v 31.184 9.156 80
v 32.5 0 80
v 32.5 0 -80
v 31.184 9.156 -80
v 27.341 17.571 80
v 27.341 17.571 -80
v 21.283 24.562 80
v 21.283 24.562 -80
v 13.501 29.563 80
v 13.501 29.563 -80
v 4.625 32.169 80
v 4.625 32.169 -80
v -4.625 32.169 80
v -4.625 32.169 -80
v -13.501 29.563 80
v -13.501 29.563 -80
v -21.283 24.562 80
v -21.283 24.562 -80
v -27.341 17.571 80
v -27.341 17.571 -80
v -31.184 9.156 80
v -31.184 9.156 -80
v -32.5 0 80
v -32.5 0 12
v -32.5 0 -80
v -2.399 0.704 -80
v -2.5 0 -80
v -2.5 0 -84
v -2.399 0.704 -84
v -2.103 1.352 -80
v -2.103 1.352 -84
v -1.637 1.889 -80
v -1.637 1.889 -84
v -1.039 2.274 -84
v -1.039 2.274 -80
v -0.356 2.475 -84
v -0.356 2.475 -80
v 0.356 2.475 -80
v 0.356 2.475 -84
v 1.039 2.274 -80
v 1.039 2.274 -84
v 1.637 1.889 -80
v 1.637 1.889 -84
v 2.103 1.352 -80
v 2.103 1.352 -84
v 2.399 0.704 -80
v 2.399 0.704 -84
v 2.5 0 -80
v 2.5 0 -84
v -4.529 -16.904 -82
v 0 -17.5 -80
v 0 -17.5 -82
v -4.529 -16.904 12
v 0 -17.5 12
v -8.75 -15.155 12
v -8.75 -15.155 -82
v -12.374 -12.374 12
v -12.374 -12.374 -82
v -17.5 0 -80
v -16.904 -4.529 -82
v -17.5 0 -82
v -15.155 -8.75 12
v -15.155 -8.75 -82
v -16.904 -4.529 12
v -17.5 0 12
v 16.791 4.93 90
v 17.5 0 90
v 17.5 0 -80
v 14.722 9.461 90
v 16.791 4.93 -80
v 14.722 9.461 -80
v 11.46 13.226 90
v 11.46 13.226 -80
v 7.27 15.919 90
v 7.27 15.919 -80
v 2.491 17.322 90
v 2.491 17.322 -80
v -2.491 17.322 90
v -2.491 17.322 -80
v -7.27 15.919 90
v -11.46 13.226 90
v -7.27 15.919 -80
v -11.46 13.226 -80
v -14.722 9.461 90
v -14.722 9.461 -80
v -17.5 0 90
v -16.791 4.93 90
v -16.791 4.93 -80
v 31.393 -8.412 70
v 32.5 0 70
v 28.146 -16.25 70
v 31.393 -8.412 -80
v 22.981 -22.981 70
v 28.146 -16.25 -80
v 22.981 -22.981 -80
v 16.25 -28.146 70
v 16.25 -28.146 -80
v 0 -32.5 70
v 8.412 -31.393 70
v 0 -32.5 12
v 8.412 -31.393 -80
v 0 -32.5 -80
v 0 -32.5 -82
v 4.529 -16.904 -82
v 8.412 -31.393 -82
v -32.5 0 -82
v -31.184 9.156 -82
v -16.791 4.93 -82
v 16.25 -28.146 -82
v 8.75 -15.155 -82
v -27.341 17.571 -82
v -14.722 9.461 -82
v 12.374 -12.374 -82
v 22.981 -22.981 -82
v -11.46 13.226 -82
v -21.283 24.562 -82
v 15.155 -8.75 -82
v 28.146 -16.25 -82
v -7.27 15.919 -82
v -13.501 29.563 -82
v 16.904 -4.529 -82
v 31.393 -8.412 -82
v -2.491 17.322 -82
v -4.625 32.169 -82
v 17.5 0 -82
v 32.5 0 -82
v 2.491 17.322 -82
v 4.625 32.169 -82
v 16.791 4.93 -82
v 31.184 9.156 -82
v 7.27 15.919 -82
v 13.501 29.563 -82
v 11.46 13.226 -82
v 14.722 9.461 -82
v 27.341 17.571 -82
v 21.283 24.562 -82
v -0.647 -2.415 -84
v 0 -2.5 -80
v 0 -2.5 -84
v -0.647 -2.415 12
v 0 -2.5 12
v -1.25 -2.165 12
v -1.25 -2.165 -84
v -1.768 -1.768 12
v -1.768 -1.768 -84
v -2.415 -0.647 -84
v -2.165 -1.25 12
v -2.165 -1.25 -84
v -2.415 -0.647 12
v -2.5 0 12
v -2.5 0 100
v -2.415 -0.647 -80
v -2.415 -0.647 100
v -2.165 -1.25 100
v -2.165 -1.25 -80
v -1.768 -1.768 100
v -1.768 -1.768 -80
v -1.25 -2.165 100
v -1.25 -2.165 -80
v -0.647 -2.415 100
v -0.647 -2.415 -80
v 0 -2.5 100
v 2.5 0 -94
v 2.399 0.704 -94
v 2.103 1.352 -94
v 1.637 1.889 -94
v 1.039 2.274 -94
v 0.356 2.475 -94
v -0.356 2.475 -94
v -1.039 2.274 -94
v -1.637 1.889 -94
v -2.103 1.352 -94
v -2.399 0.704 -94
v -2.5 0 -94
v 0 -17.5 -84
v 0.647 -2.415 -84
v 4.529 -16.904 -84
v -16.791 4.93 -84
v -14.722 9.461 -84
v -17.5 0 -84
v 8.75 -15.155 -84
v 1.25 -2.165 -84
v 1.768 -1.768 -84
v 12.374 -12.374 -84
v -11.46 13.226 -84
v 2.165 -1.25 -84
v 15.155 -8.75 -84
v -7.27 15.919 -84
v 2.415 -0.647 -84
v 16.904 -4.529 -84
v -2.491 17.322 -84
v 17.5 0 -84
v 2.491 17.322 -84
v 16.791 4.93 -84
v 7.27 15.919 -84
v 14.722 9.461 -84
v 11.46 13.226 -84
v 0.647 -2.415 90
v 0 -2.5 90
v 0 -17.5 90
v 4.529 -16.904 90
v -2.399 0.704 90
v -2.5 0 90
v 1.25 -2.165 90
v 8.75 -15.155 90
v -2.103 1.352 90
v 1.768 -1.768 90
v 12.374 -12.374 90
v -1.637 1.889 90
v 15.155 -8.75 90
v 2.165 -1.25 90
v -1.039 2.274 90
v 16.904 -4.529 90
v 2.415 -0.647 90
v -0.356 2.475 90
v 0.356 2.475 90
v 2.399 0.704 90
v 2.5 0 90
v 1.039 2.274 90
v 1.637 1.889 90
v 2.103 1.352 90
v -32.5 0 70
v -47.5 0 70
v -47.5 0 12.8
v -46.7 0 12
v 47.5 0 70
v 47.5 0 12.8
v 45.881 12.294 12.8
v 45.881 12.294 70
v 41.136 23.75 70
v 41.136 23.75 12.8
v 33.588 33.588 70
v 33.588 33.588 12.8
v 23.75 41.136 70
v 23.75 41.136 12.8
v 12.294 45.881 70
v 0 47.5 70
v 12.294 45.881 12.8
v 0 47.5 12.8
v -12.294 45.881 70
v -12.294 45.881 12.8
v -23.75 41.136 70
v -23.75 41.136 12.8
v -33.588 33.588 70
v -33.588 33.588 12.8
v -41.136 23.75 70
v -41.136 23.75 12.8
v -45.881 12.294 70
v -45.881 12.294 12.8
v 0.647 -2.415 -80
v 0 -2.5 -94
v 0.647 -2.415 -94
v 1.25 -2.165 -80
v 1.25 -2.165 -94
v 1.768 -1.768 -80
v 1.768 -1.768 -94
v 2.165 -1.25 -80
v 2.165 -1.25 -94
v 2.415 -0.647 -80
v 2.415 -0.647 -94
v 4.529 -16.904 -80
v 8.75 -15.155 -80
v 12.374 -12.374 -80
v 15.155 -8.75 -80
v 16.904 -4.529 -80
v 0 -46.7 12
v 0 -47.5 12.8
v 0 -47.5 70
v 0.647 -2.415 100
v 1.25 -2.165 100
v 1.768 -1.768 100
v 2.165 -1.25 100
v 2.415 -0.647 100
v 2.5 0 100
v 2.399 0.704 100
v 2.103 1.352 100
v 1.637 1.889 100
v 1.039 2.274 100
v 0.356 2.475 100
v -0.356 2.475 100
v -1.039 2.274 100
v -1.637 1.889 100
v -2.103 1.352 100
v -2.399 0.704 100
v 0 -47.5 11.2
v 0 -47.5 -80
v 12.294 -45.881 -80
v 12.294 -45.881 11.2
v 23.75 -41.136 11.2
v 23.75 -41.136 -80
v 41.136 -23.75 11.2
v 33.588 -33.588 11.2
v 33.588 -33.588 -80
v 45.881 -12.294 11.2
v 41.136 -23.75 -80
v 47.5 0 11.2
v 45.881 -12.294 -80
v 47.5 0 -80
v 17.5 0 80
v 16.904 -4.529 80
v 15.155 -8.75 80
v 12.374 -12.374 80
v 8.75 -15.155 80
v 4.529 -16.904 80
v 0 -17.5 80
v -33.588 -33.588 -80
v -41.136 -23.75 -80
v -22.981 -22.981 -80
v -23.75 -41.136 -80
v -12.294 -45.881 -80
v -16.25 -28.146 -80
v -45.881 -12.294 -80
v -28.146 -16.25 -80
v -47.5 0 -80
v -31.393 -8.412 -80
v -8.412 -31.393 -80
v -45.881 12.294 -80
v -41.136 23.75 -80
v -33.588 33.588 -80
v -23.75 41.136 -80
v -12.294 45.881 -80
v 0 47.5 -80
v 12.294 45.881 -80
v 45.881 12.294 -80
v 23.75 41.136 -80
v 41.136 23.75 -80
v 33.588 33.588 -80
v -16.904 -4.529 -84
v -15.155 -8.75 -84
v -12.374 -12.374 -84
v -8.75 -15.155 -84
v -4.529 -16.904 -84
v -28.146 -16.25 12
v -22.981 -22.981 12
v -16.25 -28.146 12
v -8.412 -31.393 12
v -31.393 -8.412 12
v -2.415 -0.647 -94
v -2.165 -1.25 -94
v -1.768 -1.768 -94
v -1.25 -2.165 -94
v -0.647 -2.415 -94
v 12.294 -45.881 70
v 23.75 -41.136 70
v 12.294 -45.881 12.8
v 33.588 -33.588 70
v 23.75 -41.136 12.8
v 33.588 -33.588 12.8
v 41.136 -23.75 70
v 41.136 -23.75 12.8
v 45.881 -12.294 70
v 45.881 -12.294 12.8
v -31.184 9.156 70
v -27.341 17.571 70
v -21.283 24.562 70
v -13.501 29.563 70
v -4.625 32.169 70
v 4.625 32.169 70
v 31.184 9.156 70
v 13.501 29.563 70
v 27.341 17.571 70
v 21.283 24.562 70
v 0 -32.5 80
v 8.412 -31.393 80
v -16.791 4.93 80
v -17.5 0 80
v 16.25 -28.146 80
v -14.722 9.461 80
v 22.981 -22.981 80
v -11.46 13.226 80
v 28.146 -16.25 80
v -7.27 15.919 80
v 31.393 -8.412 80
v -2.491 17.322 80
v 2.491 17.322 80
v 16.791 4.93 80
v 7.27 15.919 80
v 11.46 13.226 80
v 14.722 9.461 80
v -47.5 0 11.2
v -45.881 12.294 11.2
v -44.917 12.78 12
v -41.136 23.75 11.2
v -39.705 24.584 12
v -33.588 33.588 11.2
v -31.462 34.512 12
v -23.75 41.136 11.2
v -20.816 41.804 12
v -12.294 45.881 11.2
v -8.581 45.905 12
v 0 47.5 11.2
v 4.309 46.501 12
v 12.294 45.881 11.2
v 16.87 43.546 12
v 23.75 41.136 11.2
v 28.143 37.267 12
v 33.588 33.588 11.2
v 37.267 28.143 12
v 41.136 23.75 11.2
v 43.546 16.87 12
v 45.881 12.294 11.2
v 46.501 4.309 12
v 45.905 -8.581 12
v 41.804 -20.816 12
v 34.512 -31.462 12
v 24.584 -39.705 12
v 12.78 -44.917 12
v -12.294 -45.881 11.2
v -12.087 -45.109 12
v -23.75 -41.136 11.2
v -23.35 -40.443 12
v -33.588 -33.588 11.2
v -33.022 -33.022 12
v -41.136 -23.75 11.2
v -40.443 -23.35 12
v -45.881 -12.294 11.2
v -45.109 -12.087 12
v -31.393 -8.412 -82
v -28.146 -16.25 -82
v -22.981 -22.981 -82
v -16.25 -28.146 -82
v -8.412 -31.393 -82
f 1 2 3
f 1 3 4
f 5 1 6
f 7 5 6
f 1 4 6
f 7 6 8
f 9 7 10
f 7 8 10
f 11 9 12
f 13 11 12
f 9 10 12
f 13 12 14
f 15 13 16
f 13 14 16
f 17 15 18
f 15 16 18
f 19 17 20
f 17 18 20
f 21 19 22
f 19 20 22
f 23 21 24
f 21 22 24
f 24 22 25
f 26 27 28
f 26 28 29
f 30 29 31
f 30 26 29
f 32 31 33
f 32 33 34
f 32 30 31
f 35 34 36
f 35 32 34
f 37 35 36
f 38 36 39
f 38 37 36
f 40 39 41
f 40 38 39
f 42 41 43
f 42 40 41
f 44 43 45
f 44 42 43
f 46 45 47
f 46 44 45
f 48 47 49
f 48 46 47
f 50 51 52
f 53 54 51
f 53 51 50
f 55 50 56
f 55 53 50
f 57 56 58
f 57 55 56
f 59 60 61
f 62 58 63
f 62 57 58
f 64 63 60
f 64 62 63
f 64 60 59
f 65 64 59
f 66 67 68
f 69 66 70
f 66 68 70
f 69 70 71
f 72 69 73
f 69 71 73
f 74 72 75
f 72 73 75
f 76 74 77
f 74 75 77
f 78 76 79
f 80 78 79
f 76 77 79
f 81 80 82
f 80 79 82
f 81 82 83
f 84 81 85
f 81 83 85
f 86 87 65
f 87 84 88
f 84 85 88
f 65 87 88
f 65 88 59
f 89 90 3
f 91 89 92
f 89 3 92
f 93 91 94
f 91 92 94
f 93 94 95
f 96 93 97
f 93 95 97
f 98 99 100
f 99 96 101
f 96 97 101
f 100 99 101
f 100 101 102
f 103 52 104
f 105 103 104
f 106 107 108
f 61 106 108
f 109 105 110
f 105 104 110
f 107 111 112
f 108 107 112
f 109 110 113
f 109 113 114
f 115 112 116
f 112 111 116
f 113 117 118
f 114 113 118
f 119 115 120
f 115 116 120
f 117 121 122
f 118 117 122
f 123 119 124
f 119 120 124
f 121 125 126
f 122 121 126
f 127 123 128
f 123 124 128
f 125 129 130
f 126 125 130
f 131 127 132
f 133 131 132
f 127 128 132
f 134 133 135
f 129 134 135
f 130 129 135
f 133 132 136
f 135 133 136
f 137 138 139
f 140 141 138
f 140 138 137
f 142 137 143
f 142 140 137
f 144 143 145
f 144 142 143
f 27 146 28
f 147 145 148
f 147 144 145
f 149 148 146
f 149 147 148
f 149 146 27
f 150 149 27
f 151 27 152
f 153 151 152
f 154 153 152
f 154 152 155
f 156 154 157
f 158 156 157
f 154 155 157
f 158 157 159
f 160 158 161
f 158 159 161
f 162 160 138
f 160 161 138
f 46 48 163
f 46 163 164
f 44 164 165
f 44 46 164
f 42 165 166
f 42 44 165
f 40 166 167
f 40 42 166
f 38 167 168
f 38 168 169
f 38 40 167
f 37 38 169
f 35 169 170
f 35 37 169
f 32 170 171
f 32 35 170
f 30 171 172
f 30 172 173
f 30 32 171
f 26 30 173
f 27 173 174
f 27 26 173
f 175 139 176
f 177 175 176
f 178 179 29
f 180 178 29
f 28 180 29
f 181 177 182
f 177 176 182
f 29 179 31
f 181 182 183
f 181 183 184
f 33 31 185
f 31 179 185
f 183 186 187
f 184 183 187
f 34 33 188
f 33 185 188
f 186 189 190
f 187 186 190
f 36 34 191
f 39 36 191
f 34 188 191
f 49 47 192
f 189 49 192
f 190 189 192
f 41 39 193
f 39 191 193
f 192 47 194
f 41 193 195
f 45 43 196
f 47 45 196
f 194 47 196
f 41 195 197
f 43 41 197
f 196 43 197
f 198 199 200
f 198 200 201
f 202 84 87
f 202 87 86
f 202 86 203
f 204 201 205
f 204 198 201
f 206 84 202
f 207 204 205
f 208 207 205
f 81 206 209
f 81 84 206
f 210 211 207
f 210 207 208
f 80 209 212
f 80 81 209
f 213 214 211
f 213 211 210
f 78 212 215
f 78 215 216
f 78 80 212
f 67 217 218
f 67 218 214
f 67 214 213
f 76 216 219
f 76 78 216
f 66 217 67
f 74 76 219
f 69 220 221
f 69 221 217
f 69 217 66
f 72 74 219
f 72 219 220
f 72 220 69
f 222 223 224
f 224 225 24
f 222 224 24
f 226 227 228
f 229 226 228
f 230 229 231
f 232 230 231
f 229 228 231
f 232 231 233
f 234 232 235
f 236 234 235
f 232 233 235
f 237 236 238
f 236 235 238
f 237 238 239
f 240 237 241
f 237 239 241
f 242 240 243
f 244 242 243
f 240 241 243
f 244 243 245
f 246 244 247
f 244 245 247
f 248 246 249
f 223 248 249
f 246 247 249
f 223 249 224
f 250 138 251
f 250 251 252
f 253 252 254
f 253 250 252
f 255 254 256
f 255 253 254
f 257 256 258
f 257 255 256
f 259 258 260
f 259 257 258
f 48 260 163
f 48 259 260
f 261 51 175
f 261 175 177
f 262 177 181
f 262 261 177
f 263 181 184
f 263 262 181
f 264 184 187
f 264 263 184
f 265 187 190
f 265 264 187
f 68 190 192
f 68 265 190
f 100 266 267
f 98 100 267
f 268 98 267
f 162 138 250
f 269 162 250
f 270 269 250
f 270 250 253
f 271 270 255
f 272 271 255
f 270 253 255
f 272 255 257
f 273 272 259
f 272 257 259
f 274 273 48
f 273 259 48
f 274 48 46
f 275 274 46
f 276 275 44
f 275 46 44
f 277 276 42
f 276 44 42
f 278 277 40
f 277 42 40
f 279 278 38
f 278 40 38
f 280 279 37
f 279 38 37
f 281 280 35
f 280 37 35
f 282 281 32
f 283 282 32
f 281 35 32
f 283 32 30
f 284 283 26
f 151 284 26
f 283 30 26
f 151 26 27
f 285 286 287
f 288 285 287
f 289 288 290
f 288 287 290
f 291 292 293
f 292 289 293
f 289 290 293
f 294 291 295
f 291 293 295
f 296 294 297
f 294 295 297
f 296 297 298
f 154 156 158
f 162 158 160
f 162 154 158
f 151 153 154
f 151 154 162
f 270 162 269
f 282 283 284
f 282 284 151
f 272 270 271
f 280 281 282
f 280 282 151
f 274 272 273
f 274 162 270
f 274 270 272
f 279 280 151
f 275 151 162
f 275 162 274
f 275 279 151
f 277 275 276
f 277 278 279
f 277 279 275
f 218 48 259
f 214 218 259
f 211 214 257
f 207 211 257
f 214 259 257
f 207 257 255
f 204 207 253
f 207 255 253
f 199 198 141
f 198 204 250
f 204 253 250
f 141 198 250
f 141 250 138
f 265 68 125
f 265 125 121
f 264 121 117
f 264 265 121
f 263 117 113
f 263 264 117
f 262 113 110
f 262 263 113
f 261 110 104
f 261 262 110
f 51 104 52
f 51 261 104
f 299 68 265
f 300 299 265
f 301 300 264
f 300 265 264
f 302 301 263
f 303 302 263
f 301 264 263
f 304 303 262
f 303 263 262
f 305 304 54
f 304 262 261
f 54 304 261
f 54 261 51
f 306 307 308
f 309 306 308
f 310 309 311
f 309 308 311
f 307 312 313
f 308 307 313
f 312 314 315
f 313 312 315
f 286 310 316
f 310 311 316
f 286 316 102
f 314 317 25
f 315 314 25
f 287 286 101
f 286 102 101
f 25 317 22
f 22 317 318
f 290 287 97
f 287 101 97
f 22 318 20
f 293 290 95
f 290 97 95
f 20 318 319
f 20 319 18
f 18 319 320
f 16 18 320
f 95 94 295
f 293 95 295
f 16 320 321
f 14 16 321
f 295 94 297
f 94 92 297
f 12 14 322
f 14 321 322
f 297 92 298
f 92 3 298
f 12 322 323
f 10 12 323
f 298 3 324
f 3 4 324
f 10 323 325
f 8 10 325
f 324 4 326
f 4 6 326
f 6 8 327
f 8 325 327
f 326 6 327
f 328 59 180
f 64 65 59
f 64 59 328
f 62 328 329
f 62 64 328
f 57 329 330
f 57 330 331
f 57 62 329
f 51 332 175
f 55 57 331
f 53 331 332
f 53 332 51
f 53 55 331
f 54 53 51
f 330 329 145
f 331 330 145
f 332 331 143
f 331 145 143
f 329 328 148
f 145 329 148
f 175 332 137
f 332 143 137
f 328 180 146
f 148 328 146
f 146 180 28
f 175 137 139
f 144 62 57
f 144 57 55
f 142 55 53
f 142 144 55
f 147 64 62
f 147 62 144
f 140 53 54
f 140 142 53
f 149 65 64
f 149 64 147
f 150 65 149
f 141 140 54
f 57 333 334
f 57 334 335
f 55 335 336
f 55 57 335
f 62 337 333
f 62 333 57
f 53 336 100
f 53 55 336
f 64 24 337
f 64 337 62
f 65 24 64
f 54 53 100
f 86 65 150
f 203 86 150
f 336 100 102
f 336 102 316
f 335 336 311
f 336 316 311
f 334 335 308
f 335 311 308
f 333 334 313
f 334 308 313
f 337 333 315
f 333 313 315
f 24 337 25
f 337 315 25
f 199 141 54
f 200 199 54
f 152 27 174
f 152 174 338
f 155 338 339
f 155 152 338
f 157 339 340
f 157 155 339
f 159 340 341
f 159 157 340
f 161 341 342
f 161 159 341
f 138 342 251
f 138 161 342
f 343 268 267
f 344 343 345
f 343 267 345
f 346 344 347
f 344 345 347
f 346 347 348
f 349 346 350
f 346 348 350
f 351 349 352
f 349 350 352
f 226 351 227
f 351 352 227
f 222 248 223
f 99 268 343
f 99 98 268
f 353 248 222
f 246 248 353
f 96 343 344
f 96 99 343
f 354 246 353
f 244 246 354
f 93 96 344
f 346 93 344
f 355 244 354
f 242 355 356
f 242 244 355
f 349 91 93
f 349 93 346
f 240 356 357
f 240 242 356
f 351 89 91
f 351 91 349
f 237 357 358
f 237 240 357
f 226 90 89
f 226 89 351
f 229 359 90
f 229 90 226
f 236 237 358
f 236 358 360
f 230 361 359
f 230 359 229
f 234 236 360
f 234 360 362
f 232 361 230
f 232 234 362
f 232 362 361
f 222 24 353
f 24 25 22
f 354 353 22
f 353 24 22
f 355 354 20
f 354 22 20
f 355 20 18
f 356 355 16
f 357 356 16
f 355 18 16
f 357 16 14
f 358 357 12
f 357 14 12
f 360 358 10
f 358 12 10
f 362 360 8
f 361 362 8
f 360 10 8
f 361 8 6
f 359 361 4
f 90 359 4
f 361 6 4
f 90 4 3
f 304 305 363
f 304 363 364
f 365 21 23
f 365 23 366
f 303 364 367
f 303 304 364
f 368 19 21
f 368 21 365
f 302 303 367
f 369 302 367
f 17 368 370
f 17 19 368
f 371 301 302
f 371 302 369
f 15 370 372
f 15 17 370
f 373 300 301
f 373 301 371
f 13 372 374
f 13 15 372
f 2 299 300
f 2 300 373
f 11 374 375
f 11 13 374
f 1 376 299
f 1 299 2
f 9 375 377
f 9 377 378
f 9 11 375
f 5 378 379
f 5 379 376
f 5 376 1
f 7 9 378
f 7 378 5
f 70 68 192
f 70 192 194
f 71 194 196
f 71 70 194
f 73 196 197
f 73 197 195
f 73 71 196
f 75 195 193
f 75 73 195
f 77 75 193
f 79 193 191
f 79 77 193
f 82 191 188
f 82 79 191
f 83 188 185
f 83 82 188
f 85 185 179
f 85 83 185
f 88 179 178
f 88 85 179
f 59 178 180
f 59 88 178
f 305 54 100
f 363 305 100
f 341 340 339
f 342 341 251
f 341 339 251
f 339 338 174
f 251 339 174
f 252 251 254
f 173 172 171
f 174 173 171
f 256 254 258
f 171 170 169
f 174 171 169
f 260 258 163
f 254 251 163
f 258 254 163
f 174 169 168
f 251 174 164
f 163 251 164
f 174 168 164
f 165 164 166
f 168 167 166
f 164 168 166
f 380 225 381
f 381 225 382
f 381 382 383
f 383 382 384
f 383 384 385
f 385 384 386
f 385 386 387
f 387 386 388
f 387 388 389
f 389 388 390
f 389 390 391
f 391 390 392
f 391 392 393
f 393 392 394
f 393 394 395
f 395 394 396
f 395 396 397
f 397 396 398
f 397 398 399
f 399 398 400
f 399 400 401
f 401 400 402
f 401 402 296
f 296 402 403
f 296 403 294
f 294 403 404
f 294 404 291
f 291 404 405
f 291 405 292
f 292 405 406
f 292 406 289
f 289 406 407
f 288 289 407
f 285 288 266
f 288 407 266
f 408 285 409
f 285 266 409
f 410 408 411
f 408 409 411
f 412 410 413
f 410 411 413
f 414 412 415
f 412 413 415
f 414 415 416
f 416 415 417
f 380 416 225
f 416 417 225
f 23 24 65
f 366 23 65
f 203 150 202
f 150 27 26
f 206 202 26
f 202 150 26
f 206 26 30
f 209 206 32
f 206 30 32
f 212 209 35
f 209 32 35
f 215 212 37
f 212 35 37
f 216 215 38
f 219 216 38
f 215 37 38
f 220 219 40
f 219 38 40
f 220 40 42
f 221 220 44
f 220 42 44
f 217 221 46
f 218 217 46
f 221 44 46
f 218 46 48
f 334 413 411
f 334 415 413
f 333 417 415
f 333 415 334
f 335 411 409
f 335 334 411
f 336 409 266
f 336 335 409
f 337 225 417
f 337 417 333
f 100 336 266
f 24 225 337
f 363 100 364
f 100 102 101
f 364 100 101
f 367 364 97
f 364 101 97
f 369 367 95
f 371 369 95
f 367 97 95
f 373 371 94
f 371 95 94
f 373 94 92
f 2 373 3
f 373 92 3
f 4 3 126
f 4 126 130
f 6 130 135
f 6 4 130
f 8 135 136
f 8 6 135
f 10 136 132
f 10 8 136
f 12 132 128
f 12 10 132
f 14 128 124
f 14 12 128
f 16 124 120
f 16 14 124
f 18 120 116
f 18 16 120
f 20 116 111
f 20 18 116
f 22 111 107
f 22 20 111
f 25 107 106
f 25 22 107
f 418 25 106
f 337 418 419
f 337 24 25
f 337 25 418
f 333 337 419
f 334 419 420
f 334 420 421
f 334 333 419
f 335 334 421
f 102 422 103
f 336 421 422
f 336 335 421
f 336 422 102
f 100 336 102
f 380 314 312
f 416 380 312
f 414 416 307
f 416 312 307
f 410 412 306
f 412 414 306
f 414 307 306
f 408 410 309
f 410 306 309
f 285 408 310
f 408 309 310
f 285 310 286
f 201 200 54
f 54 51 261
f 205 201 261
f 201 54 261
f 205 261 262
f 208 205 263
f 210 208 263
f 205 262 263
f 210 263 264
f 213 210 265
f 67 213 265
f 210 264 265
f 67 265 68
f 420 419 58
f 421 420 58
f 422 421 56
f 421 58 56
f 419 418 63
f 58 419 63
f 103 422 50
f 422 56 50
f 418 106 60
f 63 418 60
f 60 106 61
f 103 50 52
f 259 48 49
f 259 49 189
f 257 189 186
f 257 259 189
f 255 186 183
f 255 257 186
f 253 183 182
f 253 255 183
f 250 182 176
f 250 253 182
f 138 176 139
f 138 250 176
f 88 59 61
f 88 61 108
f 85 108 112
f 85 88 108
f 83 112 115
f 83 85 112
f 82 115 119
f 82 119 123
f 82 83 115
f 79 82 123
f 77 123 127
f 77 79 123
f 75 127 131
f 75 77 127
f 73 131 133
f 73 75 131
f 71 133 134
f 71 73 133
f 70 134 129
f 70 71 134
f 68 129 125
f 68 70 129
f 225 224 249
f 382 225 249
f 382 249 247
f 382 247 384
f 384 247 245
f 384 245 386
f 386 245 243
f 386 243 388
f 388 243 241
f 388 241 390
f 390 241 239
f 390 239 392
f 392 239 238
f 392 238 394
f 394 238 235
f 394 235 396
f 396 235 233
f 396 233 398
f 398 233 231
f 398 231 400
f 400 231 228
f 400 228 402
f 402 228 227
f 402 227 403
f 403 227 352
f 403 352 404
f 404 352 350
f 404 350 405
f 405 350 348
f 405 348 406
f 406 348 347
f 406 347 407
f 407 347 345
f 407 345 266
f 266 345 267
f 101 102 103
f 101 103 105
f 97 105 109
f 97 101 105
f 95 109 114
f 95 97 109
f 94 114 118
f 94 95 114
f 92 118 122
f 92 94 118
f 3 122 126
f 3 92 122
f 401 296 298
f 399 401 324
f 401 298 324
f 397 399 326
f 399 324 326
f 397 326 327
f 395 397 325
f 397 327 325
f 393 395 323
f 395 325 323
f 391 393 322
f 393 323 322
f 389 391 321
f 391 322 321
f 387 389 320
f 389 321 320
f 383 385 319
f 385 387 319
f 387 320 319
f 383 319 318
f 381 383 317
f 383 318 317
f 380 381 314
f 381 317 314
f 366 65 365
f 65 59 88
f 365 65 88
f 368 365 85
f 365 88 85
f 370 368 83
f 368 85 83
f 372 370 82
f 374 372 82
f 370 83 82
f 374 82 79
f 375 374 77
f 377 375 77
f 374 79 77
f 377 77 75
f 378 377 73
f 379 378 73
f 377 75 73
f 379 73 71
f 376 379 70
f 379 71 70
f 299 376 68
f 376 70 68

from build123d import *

# Parameters (mm, degrees)
F7_DEPTH       = 150
F8_DEPTH       = 92
F9_DEPTH       = 92
F9_DEPTH_BACK  = 2
F10_DEPTH      = 160
F10_DEPTH_BACK = 2
F11_DEPTH      = 92
F11_DEPTH_BACK = 4
F12_DEPTH      = 170
F12_DEPTH_BACK = 4
F13_DEPTH      = 180
F13_DEPTH_BACK = 14


with BuildPart() as f7:
    # F1 (on offset) → F7 (new body, through all)
    with BuildSketch(Plane.XY.offset(-80)):
        with BuildLine():
            ThreePointArc((0, -47.5), (33.5875721064, -33.5875721064), (47.5, 0))
            ThreePointArc((47.5, 0), (0, 47.5), (-47.5, 0))
            Line((-47.5, 0), (-32.5, 0))
            ThreePointArc((-32.5, 0), (0, 32.5), (32.5, 0))
            ThreePointArc((32.5, 0), (22.9809703886, -22.9809703886), (0, -32.5))
            Line((0, -32.5), (0, -47.5))
        make_face()
    extrude(amount=F7_DEPTH)

    # F1 (on offset) → F8 (join, through all)
    with BuildSketch(Plane.XY.offset(-80)):
        with BuildLine():
            Line((-32.5, 0), (-47.5, 0))
            ThreePointArc((-47.5, 0), (-33.5875721064, -33.5875721064), (0, -47.5))
            Line((0, -47.5), (0, -32.5))
            ThreePointArc((0, -32.5), (-22.9809703886, -22.9809703886), (-32.5, 0))
        make_face()
    extrude(amount=F8_DEPTH)

    # F14 (on face) → F15 (revolve, cut)
    with BuildSketch(Plane.XZ):
        Polygon((-46.7, 12), (-47.5, 12.8), (-47.5, 12), (-47.5, 11.2), align=None)
    revolve(axis=Axis((0, 0, -80), (0, 0, -1)), mode=Mode.SUBTRACT)


with BuildPart() as f9:
    # F1 (on offset) → F9 (new body, two sides)
    with BuildSketch(Plane.XY.offset(-80)) as f9_sk:
        with BuildLine():
            Line((-17.5, 0), (-32.5, 0))
            ThreePointArc((-32.5, 0), (-22.9809703886, -22.9809703886), (0, -32.5))
            Line((0, -32.5), (0, -17.5))
            ThreePointArc((0, -17.5), (-12.3743686708, -12.3743686708), (-17.5, 0))
        make_face()
    extrude(amount=F9_DEPTH)
    extrude(f9_sk.sketch, amount=-F9_DEPTH_BACK)

    # F1 (on offset) → F10 (join, two sides)
    with BuildSketch(Plane.XY.offset(-80)) as f10_sk:
        with BuildLine():
            ThreePointArc((32.5, 0), (0, 32.5), (-32.5, 0))
            Line((-32.5, 0), (-17.5, 0))
            ThreePointArc((-17.5, 0), (0, 17.5), (17.5, 0))
            ThreePointArc((17.5, 0), (12.3743686708, -12.3743686708), (0, -17.5))
            Line((0, -17.5), (0, -32.5))
            ThreePointArc((0, -32.5), (22.9809703886, -22.9809703886), (32.5, 0))
        make_face()
    extrude(amount=F10_DEPTH)
    extrude(f10_sk.sketch, amount=-F10_DEPTH_BACK)


with BuildPart() as f11:
    # F1 (on offset) → F11 (new body, two sides)
    with BuildSketch(Plane.XY.offset(-80)) as f11_sk:
        with BuildLine():
            Line((-2.5, 0), (-17.5, 0))
            ThreePointArc((-17.5, 0), (-12.3743686708, -12.3743686708), (0, -17.5))
            Line((0, -17.5), (0, -2.5))
            ThreePointArc((0, -2.5), (-1.767766953, -1.767766953), (-2.5, 0))
        make_face()
    extrude(amount=F11_DEPTH)
    extrude(f11_sk.sketch, amount=-F11_DEPTH_BACK)

    # F1 (on offset) → F12 (join, two sides)
    with BuildSketch(Plane.XY.offset(-80)) as f12_sk:
        with BuildLine():
            ThreePointArc((17.5, 0), (0, 17.5), (-17.5, 0))
            Line((-17.5, 0), (-2.5, 0))
            ThreePointArc((-2.5, 0), (0, 2.5), (2.5, 0))
            ThreePointArc((2.5, 0), (1.767766953, -1.767766953), (0, -2.5))
            Line((0, -2.5), (0, -17.5))
            ThreePointArc((0, -17.5), (12.3743686708, -12.3743686708), (17.5, 0))
        make_face()
    extrude(amount=F12_DEPTH)
    extrude(f12_sk.sketch, amount=-F12_DEPTH_BACK)


with BuildPart() as f13:
    # F1 (on offset) → F13 (new body, two sides)
    with BuildSketch(Plane.XY.offset(-80)) as f13_sk:
        with BuildLine():
            ThreePointArc((2.5, 0), (0, 2.5), (-2.5, 0))
            ThreePointArc((-2.5, 0), (-1.767766953, -1.767766953), (0, -2.5))
            ThreePointArc((0, -2.5), (1.767766953, -1.767766953), (2.5, 0))
        make_face()
    extrude(amount=F13_DEPTH)
    extrude(f13_sk.sketch, amount=-F13_DEPTH_BACK)


solid = Compound([f7.part, f9.part, f11.part, f13.part])
